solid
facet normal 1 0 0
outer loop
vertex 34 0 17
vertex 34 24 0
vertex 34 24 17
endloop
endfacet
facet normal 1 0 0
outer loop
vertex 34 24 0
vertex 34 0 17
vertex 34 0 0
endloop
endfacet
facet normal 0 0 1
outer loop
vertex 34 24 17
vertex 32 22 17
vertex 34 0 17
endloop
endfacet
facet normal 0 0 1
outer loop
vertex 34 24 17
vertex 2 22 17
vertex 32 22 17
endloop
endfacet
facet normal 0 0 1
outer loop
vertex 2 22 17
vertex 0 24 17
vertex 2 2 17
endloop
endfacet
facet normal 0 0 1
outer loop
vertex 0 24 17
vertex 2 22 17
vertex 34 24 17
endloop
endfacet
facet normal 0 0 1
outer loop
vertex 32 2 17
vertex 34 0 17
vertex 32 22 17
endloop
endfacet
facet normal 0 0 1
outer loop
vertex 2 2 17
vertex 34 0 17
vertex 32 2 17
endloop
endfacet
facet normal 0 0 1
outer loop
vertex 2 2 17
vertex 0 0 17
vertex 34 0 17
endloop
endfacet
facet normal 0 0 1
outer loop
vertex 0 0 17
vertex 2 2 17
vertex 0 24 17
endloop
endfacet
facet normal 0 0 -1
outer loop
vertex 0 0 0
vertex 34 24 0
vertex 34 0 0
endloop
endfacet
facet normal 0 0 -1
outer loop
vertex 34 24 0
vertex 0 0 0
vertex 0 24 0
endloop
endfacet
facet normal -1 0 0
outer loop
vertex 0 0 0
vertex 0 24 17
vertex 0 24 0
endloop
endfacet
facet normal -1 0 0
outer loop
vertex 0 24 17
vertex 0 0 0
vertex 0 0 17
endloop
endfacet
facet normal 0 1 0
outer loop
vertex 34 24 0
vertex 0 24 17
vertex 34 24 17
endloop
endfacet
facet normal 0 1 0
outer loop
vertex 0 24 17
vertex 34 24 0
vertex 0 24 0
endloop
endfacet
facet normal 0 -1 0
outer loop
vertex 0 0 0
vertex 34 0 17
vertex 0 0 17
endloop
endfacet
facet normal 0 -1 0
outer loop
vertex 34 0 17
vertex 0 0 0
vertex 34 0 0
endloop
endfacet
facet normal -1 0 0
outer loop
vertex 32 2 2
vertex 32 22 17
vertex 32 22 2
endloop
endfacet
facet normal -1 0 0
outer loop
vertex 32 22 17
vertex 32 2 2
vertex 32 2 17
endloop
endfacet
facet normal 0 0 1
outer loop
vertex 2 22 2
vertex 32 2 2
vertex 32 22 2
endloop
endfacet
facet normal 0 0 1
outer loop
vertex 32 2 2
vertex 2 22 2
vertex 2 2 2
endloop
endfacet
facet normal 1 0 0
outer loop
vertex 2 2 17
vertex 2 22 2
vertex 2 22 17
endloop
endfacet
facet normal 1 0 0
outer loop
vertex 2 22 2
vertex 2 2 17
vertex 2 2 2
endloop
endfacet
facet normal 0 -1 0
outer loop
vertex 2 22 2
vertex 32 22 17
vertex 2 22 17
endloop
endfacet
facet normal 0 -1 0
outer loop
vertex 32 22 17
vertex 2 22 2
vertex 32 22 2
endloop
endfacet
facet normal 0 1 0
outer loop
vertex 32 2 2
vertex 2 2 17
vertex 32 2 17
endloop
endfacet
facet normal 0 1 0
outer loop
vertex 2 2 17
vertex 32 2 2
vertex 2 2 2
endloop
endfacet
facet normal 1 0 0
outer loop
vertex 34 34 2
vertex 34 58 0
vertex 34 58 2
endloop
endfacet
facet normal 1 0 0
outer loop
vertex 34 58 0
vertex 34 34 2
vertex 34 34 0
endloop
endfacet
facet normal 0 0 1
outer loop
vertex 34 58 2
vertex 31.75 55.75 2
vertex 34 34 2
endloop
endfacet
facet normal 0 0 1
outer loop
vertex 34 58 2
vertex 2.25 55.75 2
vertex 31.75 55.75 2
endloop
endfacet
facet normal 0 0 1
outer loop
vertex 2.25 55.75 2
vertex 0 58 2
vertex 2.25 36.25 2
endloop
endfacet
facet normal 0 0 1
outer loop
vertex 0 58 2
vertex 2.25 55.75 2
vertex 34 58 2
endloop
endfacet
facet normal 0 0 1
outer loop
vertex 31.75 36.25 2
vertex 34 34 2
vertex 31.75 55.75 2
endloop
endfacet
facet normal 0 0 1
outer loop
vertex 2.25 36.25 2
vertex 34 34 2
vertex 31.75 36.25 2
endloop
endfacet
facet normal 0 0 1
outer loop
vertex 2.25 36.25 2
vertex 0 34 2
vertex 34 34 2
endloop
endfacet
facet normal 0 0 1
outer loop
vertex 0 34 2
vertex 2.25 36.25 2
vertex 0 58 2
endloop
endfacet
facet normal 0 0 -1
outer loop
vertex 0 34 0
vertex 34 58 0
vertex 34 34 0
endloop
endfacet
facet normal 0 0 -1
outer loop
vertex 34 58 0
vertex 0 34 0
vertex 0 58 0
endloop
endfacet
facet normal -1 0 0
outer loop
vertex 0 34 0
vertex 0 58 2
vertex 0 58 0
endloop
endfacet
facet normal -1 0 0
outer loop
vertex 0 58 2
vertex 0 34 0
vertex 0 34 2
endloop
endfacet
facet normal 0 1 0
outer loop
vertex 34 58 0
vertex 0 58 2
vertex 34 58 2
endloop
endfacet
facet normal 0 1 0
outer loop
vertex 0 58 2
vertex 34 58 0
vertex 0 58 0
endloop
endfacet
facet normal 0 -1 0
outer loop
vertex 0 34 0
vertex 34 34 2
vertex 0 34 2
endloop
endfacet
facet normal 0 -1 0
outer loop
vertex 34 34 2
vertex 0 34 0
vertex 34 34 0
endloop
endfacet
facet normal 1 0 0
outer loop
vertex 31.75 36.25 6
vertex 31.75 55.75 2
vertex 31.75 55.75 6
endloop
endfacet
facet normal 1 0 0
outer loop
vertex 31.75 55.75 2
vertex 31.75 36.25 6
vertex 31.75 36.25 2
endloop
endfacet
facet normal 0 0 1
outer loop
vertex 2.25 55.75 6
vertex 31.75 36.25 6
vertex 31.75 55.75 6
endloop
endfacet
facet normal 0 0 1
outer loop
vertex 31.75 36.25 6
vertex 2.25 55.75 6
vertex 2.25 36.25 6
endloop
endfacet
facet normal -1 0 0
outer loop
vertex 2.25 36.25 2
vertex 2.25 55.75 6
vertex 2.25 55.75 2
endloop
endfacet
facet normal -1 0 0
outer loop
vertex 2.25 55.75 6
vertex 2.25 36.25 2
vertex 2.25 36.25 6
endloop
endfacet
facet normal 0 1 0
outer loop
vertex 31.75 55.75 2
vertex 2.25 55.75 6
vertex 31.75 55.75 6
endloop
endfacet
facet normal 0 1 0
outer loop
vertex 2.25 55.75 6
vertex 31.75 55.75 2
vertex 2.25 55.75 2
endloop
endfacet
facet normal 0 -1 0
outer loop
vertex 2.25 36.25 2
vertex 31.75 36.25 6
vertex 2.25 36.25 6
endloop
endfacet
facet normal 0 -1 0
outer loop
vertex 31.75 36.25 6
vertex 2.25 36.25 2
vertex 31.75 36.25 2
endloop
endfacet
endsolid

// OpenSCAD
// Box with a press-fit lid - a hollow rectangular box (open top) and a separate lid whose plug
// drops into the opening. The two parts are laid side by side. NOVEL general part.
//
// @desc hollow box with a separate press-fit lid
// @prompt Design a small box with a lid in OpenSCAD: an inner space {il} by {iw} by {ih} mm with {wall} mm walls, and a separate lid whose plug drops {lip} mm into the opening. Lay the two parts side by side. Reply with a single complete OpenSCAD file.
// @param il   inner length, mm     [20:80]
// @param iw   inner width, mm      [20:60]
// @param ih   inner height, mm     [10:50]
// @param wall wall thickness, mm   [1.6:4]
// @param lip  lid plug depth, mm   [3:10]

il   = 30;
iw   = 20;
ih   = 15;
wall = 2;
lip  = 4;

$fn = 32;

ol = il + 2 * wall;
ow = iw + 2 * wall;

module box() {
    difference() {
        cube([ol, ow, ih + wall]);
        translate([wall, wall, wall]) cube([il, iw, ih + 1]);   // open-top cavity
    }
}

module lid() {
    cl = il - 0.5;                 // plug: 0.25 mm clearance per side
    cw = iw - 0.5;
    union() {
        cube([ol, ow, wall]);                                    // top plate, full footprint
        translate([(ol - cl) / 2, (ow - cw) / 2, 0])
            cube([cl, cw, wall + lip]);                          // plug (overlaps the plate -> one solid)
    }
}

box();
translate([0, ow + 10, 0]) lid();
